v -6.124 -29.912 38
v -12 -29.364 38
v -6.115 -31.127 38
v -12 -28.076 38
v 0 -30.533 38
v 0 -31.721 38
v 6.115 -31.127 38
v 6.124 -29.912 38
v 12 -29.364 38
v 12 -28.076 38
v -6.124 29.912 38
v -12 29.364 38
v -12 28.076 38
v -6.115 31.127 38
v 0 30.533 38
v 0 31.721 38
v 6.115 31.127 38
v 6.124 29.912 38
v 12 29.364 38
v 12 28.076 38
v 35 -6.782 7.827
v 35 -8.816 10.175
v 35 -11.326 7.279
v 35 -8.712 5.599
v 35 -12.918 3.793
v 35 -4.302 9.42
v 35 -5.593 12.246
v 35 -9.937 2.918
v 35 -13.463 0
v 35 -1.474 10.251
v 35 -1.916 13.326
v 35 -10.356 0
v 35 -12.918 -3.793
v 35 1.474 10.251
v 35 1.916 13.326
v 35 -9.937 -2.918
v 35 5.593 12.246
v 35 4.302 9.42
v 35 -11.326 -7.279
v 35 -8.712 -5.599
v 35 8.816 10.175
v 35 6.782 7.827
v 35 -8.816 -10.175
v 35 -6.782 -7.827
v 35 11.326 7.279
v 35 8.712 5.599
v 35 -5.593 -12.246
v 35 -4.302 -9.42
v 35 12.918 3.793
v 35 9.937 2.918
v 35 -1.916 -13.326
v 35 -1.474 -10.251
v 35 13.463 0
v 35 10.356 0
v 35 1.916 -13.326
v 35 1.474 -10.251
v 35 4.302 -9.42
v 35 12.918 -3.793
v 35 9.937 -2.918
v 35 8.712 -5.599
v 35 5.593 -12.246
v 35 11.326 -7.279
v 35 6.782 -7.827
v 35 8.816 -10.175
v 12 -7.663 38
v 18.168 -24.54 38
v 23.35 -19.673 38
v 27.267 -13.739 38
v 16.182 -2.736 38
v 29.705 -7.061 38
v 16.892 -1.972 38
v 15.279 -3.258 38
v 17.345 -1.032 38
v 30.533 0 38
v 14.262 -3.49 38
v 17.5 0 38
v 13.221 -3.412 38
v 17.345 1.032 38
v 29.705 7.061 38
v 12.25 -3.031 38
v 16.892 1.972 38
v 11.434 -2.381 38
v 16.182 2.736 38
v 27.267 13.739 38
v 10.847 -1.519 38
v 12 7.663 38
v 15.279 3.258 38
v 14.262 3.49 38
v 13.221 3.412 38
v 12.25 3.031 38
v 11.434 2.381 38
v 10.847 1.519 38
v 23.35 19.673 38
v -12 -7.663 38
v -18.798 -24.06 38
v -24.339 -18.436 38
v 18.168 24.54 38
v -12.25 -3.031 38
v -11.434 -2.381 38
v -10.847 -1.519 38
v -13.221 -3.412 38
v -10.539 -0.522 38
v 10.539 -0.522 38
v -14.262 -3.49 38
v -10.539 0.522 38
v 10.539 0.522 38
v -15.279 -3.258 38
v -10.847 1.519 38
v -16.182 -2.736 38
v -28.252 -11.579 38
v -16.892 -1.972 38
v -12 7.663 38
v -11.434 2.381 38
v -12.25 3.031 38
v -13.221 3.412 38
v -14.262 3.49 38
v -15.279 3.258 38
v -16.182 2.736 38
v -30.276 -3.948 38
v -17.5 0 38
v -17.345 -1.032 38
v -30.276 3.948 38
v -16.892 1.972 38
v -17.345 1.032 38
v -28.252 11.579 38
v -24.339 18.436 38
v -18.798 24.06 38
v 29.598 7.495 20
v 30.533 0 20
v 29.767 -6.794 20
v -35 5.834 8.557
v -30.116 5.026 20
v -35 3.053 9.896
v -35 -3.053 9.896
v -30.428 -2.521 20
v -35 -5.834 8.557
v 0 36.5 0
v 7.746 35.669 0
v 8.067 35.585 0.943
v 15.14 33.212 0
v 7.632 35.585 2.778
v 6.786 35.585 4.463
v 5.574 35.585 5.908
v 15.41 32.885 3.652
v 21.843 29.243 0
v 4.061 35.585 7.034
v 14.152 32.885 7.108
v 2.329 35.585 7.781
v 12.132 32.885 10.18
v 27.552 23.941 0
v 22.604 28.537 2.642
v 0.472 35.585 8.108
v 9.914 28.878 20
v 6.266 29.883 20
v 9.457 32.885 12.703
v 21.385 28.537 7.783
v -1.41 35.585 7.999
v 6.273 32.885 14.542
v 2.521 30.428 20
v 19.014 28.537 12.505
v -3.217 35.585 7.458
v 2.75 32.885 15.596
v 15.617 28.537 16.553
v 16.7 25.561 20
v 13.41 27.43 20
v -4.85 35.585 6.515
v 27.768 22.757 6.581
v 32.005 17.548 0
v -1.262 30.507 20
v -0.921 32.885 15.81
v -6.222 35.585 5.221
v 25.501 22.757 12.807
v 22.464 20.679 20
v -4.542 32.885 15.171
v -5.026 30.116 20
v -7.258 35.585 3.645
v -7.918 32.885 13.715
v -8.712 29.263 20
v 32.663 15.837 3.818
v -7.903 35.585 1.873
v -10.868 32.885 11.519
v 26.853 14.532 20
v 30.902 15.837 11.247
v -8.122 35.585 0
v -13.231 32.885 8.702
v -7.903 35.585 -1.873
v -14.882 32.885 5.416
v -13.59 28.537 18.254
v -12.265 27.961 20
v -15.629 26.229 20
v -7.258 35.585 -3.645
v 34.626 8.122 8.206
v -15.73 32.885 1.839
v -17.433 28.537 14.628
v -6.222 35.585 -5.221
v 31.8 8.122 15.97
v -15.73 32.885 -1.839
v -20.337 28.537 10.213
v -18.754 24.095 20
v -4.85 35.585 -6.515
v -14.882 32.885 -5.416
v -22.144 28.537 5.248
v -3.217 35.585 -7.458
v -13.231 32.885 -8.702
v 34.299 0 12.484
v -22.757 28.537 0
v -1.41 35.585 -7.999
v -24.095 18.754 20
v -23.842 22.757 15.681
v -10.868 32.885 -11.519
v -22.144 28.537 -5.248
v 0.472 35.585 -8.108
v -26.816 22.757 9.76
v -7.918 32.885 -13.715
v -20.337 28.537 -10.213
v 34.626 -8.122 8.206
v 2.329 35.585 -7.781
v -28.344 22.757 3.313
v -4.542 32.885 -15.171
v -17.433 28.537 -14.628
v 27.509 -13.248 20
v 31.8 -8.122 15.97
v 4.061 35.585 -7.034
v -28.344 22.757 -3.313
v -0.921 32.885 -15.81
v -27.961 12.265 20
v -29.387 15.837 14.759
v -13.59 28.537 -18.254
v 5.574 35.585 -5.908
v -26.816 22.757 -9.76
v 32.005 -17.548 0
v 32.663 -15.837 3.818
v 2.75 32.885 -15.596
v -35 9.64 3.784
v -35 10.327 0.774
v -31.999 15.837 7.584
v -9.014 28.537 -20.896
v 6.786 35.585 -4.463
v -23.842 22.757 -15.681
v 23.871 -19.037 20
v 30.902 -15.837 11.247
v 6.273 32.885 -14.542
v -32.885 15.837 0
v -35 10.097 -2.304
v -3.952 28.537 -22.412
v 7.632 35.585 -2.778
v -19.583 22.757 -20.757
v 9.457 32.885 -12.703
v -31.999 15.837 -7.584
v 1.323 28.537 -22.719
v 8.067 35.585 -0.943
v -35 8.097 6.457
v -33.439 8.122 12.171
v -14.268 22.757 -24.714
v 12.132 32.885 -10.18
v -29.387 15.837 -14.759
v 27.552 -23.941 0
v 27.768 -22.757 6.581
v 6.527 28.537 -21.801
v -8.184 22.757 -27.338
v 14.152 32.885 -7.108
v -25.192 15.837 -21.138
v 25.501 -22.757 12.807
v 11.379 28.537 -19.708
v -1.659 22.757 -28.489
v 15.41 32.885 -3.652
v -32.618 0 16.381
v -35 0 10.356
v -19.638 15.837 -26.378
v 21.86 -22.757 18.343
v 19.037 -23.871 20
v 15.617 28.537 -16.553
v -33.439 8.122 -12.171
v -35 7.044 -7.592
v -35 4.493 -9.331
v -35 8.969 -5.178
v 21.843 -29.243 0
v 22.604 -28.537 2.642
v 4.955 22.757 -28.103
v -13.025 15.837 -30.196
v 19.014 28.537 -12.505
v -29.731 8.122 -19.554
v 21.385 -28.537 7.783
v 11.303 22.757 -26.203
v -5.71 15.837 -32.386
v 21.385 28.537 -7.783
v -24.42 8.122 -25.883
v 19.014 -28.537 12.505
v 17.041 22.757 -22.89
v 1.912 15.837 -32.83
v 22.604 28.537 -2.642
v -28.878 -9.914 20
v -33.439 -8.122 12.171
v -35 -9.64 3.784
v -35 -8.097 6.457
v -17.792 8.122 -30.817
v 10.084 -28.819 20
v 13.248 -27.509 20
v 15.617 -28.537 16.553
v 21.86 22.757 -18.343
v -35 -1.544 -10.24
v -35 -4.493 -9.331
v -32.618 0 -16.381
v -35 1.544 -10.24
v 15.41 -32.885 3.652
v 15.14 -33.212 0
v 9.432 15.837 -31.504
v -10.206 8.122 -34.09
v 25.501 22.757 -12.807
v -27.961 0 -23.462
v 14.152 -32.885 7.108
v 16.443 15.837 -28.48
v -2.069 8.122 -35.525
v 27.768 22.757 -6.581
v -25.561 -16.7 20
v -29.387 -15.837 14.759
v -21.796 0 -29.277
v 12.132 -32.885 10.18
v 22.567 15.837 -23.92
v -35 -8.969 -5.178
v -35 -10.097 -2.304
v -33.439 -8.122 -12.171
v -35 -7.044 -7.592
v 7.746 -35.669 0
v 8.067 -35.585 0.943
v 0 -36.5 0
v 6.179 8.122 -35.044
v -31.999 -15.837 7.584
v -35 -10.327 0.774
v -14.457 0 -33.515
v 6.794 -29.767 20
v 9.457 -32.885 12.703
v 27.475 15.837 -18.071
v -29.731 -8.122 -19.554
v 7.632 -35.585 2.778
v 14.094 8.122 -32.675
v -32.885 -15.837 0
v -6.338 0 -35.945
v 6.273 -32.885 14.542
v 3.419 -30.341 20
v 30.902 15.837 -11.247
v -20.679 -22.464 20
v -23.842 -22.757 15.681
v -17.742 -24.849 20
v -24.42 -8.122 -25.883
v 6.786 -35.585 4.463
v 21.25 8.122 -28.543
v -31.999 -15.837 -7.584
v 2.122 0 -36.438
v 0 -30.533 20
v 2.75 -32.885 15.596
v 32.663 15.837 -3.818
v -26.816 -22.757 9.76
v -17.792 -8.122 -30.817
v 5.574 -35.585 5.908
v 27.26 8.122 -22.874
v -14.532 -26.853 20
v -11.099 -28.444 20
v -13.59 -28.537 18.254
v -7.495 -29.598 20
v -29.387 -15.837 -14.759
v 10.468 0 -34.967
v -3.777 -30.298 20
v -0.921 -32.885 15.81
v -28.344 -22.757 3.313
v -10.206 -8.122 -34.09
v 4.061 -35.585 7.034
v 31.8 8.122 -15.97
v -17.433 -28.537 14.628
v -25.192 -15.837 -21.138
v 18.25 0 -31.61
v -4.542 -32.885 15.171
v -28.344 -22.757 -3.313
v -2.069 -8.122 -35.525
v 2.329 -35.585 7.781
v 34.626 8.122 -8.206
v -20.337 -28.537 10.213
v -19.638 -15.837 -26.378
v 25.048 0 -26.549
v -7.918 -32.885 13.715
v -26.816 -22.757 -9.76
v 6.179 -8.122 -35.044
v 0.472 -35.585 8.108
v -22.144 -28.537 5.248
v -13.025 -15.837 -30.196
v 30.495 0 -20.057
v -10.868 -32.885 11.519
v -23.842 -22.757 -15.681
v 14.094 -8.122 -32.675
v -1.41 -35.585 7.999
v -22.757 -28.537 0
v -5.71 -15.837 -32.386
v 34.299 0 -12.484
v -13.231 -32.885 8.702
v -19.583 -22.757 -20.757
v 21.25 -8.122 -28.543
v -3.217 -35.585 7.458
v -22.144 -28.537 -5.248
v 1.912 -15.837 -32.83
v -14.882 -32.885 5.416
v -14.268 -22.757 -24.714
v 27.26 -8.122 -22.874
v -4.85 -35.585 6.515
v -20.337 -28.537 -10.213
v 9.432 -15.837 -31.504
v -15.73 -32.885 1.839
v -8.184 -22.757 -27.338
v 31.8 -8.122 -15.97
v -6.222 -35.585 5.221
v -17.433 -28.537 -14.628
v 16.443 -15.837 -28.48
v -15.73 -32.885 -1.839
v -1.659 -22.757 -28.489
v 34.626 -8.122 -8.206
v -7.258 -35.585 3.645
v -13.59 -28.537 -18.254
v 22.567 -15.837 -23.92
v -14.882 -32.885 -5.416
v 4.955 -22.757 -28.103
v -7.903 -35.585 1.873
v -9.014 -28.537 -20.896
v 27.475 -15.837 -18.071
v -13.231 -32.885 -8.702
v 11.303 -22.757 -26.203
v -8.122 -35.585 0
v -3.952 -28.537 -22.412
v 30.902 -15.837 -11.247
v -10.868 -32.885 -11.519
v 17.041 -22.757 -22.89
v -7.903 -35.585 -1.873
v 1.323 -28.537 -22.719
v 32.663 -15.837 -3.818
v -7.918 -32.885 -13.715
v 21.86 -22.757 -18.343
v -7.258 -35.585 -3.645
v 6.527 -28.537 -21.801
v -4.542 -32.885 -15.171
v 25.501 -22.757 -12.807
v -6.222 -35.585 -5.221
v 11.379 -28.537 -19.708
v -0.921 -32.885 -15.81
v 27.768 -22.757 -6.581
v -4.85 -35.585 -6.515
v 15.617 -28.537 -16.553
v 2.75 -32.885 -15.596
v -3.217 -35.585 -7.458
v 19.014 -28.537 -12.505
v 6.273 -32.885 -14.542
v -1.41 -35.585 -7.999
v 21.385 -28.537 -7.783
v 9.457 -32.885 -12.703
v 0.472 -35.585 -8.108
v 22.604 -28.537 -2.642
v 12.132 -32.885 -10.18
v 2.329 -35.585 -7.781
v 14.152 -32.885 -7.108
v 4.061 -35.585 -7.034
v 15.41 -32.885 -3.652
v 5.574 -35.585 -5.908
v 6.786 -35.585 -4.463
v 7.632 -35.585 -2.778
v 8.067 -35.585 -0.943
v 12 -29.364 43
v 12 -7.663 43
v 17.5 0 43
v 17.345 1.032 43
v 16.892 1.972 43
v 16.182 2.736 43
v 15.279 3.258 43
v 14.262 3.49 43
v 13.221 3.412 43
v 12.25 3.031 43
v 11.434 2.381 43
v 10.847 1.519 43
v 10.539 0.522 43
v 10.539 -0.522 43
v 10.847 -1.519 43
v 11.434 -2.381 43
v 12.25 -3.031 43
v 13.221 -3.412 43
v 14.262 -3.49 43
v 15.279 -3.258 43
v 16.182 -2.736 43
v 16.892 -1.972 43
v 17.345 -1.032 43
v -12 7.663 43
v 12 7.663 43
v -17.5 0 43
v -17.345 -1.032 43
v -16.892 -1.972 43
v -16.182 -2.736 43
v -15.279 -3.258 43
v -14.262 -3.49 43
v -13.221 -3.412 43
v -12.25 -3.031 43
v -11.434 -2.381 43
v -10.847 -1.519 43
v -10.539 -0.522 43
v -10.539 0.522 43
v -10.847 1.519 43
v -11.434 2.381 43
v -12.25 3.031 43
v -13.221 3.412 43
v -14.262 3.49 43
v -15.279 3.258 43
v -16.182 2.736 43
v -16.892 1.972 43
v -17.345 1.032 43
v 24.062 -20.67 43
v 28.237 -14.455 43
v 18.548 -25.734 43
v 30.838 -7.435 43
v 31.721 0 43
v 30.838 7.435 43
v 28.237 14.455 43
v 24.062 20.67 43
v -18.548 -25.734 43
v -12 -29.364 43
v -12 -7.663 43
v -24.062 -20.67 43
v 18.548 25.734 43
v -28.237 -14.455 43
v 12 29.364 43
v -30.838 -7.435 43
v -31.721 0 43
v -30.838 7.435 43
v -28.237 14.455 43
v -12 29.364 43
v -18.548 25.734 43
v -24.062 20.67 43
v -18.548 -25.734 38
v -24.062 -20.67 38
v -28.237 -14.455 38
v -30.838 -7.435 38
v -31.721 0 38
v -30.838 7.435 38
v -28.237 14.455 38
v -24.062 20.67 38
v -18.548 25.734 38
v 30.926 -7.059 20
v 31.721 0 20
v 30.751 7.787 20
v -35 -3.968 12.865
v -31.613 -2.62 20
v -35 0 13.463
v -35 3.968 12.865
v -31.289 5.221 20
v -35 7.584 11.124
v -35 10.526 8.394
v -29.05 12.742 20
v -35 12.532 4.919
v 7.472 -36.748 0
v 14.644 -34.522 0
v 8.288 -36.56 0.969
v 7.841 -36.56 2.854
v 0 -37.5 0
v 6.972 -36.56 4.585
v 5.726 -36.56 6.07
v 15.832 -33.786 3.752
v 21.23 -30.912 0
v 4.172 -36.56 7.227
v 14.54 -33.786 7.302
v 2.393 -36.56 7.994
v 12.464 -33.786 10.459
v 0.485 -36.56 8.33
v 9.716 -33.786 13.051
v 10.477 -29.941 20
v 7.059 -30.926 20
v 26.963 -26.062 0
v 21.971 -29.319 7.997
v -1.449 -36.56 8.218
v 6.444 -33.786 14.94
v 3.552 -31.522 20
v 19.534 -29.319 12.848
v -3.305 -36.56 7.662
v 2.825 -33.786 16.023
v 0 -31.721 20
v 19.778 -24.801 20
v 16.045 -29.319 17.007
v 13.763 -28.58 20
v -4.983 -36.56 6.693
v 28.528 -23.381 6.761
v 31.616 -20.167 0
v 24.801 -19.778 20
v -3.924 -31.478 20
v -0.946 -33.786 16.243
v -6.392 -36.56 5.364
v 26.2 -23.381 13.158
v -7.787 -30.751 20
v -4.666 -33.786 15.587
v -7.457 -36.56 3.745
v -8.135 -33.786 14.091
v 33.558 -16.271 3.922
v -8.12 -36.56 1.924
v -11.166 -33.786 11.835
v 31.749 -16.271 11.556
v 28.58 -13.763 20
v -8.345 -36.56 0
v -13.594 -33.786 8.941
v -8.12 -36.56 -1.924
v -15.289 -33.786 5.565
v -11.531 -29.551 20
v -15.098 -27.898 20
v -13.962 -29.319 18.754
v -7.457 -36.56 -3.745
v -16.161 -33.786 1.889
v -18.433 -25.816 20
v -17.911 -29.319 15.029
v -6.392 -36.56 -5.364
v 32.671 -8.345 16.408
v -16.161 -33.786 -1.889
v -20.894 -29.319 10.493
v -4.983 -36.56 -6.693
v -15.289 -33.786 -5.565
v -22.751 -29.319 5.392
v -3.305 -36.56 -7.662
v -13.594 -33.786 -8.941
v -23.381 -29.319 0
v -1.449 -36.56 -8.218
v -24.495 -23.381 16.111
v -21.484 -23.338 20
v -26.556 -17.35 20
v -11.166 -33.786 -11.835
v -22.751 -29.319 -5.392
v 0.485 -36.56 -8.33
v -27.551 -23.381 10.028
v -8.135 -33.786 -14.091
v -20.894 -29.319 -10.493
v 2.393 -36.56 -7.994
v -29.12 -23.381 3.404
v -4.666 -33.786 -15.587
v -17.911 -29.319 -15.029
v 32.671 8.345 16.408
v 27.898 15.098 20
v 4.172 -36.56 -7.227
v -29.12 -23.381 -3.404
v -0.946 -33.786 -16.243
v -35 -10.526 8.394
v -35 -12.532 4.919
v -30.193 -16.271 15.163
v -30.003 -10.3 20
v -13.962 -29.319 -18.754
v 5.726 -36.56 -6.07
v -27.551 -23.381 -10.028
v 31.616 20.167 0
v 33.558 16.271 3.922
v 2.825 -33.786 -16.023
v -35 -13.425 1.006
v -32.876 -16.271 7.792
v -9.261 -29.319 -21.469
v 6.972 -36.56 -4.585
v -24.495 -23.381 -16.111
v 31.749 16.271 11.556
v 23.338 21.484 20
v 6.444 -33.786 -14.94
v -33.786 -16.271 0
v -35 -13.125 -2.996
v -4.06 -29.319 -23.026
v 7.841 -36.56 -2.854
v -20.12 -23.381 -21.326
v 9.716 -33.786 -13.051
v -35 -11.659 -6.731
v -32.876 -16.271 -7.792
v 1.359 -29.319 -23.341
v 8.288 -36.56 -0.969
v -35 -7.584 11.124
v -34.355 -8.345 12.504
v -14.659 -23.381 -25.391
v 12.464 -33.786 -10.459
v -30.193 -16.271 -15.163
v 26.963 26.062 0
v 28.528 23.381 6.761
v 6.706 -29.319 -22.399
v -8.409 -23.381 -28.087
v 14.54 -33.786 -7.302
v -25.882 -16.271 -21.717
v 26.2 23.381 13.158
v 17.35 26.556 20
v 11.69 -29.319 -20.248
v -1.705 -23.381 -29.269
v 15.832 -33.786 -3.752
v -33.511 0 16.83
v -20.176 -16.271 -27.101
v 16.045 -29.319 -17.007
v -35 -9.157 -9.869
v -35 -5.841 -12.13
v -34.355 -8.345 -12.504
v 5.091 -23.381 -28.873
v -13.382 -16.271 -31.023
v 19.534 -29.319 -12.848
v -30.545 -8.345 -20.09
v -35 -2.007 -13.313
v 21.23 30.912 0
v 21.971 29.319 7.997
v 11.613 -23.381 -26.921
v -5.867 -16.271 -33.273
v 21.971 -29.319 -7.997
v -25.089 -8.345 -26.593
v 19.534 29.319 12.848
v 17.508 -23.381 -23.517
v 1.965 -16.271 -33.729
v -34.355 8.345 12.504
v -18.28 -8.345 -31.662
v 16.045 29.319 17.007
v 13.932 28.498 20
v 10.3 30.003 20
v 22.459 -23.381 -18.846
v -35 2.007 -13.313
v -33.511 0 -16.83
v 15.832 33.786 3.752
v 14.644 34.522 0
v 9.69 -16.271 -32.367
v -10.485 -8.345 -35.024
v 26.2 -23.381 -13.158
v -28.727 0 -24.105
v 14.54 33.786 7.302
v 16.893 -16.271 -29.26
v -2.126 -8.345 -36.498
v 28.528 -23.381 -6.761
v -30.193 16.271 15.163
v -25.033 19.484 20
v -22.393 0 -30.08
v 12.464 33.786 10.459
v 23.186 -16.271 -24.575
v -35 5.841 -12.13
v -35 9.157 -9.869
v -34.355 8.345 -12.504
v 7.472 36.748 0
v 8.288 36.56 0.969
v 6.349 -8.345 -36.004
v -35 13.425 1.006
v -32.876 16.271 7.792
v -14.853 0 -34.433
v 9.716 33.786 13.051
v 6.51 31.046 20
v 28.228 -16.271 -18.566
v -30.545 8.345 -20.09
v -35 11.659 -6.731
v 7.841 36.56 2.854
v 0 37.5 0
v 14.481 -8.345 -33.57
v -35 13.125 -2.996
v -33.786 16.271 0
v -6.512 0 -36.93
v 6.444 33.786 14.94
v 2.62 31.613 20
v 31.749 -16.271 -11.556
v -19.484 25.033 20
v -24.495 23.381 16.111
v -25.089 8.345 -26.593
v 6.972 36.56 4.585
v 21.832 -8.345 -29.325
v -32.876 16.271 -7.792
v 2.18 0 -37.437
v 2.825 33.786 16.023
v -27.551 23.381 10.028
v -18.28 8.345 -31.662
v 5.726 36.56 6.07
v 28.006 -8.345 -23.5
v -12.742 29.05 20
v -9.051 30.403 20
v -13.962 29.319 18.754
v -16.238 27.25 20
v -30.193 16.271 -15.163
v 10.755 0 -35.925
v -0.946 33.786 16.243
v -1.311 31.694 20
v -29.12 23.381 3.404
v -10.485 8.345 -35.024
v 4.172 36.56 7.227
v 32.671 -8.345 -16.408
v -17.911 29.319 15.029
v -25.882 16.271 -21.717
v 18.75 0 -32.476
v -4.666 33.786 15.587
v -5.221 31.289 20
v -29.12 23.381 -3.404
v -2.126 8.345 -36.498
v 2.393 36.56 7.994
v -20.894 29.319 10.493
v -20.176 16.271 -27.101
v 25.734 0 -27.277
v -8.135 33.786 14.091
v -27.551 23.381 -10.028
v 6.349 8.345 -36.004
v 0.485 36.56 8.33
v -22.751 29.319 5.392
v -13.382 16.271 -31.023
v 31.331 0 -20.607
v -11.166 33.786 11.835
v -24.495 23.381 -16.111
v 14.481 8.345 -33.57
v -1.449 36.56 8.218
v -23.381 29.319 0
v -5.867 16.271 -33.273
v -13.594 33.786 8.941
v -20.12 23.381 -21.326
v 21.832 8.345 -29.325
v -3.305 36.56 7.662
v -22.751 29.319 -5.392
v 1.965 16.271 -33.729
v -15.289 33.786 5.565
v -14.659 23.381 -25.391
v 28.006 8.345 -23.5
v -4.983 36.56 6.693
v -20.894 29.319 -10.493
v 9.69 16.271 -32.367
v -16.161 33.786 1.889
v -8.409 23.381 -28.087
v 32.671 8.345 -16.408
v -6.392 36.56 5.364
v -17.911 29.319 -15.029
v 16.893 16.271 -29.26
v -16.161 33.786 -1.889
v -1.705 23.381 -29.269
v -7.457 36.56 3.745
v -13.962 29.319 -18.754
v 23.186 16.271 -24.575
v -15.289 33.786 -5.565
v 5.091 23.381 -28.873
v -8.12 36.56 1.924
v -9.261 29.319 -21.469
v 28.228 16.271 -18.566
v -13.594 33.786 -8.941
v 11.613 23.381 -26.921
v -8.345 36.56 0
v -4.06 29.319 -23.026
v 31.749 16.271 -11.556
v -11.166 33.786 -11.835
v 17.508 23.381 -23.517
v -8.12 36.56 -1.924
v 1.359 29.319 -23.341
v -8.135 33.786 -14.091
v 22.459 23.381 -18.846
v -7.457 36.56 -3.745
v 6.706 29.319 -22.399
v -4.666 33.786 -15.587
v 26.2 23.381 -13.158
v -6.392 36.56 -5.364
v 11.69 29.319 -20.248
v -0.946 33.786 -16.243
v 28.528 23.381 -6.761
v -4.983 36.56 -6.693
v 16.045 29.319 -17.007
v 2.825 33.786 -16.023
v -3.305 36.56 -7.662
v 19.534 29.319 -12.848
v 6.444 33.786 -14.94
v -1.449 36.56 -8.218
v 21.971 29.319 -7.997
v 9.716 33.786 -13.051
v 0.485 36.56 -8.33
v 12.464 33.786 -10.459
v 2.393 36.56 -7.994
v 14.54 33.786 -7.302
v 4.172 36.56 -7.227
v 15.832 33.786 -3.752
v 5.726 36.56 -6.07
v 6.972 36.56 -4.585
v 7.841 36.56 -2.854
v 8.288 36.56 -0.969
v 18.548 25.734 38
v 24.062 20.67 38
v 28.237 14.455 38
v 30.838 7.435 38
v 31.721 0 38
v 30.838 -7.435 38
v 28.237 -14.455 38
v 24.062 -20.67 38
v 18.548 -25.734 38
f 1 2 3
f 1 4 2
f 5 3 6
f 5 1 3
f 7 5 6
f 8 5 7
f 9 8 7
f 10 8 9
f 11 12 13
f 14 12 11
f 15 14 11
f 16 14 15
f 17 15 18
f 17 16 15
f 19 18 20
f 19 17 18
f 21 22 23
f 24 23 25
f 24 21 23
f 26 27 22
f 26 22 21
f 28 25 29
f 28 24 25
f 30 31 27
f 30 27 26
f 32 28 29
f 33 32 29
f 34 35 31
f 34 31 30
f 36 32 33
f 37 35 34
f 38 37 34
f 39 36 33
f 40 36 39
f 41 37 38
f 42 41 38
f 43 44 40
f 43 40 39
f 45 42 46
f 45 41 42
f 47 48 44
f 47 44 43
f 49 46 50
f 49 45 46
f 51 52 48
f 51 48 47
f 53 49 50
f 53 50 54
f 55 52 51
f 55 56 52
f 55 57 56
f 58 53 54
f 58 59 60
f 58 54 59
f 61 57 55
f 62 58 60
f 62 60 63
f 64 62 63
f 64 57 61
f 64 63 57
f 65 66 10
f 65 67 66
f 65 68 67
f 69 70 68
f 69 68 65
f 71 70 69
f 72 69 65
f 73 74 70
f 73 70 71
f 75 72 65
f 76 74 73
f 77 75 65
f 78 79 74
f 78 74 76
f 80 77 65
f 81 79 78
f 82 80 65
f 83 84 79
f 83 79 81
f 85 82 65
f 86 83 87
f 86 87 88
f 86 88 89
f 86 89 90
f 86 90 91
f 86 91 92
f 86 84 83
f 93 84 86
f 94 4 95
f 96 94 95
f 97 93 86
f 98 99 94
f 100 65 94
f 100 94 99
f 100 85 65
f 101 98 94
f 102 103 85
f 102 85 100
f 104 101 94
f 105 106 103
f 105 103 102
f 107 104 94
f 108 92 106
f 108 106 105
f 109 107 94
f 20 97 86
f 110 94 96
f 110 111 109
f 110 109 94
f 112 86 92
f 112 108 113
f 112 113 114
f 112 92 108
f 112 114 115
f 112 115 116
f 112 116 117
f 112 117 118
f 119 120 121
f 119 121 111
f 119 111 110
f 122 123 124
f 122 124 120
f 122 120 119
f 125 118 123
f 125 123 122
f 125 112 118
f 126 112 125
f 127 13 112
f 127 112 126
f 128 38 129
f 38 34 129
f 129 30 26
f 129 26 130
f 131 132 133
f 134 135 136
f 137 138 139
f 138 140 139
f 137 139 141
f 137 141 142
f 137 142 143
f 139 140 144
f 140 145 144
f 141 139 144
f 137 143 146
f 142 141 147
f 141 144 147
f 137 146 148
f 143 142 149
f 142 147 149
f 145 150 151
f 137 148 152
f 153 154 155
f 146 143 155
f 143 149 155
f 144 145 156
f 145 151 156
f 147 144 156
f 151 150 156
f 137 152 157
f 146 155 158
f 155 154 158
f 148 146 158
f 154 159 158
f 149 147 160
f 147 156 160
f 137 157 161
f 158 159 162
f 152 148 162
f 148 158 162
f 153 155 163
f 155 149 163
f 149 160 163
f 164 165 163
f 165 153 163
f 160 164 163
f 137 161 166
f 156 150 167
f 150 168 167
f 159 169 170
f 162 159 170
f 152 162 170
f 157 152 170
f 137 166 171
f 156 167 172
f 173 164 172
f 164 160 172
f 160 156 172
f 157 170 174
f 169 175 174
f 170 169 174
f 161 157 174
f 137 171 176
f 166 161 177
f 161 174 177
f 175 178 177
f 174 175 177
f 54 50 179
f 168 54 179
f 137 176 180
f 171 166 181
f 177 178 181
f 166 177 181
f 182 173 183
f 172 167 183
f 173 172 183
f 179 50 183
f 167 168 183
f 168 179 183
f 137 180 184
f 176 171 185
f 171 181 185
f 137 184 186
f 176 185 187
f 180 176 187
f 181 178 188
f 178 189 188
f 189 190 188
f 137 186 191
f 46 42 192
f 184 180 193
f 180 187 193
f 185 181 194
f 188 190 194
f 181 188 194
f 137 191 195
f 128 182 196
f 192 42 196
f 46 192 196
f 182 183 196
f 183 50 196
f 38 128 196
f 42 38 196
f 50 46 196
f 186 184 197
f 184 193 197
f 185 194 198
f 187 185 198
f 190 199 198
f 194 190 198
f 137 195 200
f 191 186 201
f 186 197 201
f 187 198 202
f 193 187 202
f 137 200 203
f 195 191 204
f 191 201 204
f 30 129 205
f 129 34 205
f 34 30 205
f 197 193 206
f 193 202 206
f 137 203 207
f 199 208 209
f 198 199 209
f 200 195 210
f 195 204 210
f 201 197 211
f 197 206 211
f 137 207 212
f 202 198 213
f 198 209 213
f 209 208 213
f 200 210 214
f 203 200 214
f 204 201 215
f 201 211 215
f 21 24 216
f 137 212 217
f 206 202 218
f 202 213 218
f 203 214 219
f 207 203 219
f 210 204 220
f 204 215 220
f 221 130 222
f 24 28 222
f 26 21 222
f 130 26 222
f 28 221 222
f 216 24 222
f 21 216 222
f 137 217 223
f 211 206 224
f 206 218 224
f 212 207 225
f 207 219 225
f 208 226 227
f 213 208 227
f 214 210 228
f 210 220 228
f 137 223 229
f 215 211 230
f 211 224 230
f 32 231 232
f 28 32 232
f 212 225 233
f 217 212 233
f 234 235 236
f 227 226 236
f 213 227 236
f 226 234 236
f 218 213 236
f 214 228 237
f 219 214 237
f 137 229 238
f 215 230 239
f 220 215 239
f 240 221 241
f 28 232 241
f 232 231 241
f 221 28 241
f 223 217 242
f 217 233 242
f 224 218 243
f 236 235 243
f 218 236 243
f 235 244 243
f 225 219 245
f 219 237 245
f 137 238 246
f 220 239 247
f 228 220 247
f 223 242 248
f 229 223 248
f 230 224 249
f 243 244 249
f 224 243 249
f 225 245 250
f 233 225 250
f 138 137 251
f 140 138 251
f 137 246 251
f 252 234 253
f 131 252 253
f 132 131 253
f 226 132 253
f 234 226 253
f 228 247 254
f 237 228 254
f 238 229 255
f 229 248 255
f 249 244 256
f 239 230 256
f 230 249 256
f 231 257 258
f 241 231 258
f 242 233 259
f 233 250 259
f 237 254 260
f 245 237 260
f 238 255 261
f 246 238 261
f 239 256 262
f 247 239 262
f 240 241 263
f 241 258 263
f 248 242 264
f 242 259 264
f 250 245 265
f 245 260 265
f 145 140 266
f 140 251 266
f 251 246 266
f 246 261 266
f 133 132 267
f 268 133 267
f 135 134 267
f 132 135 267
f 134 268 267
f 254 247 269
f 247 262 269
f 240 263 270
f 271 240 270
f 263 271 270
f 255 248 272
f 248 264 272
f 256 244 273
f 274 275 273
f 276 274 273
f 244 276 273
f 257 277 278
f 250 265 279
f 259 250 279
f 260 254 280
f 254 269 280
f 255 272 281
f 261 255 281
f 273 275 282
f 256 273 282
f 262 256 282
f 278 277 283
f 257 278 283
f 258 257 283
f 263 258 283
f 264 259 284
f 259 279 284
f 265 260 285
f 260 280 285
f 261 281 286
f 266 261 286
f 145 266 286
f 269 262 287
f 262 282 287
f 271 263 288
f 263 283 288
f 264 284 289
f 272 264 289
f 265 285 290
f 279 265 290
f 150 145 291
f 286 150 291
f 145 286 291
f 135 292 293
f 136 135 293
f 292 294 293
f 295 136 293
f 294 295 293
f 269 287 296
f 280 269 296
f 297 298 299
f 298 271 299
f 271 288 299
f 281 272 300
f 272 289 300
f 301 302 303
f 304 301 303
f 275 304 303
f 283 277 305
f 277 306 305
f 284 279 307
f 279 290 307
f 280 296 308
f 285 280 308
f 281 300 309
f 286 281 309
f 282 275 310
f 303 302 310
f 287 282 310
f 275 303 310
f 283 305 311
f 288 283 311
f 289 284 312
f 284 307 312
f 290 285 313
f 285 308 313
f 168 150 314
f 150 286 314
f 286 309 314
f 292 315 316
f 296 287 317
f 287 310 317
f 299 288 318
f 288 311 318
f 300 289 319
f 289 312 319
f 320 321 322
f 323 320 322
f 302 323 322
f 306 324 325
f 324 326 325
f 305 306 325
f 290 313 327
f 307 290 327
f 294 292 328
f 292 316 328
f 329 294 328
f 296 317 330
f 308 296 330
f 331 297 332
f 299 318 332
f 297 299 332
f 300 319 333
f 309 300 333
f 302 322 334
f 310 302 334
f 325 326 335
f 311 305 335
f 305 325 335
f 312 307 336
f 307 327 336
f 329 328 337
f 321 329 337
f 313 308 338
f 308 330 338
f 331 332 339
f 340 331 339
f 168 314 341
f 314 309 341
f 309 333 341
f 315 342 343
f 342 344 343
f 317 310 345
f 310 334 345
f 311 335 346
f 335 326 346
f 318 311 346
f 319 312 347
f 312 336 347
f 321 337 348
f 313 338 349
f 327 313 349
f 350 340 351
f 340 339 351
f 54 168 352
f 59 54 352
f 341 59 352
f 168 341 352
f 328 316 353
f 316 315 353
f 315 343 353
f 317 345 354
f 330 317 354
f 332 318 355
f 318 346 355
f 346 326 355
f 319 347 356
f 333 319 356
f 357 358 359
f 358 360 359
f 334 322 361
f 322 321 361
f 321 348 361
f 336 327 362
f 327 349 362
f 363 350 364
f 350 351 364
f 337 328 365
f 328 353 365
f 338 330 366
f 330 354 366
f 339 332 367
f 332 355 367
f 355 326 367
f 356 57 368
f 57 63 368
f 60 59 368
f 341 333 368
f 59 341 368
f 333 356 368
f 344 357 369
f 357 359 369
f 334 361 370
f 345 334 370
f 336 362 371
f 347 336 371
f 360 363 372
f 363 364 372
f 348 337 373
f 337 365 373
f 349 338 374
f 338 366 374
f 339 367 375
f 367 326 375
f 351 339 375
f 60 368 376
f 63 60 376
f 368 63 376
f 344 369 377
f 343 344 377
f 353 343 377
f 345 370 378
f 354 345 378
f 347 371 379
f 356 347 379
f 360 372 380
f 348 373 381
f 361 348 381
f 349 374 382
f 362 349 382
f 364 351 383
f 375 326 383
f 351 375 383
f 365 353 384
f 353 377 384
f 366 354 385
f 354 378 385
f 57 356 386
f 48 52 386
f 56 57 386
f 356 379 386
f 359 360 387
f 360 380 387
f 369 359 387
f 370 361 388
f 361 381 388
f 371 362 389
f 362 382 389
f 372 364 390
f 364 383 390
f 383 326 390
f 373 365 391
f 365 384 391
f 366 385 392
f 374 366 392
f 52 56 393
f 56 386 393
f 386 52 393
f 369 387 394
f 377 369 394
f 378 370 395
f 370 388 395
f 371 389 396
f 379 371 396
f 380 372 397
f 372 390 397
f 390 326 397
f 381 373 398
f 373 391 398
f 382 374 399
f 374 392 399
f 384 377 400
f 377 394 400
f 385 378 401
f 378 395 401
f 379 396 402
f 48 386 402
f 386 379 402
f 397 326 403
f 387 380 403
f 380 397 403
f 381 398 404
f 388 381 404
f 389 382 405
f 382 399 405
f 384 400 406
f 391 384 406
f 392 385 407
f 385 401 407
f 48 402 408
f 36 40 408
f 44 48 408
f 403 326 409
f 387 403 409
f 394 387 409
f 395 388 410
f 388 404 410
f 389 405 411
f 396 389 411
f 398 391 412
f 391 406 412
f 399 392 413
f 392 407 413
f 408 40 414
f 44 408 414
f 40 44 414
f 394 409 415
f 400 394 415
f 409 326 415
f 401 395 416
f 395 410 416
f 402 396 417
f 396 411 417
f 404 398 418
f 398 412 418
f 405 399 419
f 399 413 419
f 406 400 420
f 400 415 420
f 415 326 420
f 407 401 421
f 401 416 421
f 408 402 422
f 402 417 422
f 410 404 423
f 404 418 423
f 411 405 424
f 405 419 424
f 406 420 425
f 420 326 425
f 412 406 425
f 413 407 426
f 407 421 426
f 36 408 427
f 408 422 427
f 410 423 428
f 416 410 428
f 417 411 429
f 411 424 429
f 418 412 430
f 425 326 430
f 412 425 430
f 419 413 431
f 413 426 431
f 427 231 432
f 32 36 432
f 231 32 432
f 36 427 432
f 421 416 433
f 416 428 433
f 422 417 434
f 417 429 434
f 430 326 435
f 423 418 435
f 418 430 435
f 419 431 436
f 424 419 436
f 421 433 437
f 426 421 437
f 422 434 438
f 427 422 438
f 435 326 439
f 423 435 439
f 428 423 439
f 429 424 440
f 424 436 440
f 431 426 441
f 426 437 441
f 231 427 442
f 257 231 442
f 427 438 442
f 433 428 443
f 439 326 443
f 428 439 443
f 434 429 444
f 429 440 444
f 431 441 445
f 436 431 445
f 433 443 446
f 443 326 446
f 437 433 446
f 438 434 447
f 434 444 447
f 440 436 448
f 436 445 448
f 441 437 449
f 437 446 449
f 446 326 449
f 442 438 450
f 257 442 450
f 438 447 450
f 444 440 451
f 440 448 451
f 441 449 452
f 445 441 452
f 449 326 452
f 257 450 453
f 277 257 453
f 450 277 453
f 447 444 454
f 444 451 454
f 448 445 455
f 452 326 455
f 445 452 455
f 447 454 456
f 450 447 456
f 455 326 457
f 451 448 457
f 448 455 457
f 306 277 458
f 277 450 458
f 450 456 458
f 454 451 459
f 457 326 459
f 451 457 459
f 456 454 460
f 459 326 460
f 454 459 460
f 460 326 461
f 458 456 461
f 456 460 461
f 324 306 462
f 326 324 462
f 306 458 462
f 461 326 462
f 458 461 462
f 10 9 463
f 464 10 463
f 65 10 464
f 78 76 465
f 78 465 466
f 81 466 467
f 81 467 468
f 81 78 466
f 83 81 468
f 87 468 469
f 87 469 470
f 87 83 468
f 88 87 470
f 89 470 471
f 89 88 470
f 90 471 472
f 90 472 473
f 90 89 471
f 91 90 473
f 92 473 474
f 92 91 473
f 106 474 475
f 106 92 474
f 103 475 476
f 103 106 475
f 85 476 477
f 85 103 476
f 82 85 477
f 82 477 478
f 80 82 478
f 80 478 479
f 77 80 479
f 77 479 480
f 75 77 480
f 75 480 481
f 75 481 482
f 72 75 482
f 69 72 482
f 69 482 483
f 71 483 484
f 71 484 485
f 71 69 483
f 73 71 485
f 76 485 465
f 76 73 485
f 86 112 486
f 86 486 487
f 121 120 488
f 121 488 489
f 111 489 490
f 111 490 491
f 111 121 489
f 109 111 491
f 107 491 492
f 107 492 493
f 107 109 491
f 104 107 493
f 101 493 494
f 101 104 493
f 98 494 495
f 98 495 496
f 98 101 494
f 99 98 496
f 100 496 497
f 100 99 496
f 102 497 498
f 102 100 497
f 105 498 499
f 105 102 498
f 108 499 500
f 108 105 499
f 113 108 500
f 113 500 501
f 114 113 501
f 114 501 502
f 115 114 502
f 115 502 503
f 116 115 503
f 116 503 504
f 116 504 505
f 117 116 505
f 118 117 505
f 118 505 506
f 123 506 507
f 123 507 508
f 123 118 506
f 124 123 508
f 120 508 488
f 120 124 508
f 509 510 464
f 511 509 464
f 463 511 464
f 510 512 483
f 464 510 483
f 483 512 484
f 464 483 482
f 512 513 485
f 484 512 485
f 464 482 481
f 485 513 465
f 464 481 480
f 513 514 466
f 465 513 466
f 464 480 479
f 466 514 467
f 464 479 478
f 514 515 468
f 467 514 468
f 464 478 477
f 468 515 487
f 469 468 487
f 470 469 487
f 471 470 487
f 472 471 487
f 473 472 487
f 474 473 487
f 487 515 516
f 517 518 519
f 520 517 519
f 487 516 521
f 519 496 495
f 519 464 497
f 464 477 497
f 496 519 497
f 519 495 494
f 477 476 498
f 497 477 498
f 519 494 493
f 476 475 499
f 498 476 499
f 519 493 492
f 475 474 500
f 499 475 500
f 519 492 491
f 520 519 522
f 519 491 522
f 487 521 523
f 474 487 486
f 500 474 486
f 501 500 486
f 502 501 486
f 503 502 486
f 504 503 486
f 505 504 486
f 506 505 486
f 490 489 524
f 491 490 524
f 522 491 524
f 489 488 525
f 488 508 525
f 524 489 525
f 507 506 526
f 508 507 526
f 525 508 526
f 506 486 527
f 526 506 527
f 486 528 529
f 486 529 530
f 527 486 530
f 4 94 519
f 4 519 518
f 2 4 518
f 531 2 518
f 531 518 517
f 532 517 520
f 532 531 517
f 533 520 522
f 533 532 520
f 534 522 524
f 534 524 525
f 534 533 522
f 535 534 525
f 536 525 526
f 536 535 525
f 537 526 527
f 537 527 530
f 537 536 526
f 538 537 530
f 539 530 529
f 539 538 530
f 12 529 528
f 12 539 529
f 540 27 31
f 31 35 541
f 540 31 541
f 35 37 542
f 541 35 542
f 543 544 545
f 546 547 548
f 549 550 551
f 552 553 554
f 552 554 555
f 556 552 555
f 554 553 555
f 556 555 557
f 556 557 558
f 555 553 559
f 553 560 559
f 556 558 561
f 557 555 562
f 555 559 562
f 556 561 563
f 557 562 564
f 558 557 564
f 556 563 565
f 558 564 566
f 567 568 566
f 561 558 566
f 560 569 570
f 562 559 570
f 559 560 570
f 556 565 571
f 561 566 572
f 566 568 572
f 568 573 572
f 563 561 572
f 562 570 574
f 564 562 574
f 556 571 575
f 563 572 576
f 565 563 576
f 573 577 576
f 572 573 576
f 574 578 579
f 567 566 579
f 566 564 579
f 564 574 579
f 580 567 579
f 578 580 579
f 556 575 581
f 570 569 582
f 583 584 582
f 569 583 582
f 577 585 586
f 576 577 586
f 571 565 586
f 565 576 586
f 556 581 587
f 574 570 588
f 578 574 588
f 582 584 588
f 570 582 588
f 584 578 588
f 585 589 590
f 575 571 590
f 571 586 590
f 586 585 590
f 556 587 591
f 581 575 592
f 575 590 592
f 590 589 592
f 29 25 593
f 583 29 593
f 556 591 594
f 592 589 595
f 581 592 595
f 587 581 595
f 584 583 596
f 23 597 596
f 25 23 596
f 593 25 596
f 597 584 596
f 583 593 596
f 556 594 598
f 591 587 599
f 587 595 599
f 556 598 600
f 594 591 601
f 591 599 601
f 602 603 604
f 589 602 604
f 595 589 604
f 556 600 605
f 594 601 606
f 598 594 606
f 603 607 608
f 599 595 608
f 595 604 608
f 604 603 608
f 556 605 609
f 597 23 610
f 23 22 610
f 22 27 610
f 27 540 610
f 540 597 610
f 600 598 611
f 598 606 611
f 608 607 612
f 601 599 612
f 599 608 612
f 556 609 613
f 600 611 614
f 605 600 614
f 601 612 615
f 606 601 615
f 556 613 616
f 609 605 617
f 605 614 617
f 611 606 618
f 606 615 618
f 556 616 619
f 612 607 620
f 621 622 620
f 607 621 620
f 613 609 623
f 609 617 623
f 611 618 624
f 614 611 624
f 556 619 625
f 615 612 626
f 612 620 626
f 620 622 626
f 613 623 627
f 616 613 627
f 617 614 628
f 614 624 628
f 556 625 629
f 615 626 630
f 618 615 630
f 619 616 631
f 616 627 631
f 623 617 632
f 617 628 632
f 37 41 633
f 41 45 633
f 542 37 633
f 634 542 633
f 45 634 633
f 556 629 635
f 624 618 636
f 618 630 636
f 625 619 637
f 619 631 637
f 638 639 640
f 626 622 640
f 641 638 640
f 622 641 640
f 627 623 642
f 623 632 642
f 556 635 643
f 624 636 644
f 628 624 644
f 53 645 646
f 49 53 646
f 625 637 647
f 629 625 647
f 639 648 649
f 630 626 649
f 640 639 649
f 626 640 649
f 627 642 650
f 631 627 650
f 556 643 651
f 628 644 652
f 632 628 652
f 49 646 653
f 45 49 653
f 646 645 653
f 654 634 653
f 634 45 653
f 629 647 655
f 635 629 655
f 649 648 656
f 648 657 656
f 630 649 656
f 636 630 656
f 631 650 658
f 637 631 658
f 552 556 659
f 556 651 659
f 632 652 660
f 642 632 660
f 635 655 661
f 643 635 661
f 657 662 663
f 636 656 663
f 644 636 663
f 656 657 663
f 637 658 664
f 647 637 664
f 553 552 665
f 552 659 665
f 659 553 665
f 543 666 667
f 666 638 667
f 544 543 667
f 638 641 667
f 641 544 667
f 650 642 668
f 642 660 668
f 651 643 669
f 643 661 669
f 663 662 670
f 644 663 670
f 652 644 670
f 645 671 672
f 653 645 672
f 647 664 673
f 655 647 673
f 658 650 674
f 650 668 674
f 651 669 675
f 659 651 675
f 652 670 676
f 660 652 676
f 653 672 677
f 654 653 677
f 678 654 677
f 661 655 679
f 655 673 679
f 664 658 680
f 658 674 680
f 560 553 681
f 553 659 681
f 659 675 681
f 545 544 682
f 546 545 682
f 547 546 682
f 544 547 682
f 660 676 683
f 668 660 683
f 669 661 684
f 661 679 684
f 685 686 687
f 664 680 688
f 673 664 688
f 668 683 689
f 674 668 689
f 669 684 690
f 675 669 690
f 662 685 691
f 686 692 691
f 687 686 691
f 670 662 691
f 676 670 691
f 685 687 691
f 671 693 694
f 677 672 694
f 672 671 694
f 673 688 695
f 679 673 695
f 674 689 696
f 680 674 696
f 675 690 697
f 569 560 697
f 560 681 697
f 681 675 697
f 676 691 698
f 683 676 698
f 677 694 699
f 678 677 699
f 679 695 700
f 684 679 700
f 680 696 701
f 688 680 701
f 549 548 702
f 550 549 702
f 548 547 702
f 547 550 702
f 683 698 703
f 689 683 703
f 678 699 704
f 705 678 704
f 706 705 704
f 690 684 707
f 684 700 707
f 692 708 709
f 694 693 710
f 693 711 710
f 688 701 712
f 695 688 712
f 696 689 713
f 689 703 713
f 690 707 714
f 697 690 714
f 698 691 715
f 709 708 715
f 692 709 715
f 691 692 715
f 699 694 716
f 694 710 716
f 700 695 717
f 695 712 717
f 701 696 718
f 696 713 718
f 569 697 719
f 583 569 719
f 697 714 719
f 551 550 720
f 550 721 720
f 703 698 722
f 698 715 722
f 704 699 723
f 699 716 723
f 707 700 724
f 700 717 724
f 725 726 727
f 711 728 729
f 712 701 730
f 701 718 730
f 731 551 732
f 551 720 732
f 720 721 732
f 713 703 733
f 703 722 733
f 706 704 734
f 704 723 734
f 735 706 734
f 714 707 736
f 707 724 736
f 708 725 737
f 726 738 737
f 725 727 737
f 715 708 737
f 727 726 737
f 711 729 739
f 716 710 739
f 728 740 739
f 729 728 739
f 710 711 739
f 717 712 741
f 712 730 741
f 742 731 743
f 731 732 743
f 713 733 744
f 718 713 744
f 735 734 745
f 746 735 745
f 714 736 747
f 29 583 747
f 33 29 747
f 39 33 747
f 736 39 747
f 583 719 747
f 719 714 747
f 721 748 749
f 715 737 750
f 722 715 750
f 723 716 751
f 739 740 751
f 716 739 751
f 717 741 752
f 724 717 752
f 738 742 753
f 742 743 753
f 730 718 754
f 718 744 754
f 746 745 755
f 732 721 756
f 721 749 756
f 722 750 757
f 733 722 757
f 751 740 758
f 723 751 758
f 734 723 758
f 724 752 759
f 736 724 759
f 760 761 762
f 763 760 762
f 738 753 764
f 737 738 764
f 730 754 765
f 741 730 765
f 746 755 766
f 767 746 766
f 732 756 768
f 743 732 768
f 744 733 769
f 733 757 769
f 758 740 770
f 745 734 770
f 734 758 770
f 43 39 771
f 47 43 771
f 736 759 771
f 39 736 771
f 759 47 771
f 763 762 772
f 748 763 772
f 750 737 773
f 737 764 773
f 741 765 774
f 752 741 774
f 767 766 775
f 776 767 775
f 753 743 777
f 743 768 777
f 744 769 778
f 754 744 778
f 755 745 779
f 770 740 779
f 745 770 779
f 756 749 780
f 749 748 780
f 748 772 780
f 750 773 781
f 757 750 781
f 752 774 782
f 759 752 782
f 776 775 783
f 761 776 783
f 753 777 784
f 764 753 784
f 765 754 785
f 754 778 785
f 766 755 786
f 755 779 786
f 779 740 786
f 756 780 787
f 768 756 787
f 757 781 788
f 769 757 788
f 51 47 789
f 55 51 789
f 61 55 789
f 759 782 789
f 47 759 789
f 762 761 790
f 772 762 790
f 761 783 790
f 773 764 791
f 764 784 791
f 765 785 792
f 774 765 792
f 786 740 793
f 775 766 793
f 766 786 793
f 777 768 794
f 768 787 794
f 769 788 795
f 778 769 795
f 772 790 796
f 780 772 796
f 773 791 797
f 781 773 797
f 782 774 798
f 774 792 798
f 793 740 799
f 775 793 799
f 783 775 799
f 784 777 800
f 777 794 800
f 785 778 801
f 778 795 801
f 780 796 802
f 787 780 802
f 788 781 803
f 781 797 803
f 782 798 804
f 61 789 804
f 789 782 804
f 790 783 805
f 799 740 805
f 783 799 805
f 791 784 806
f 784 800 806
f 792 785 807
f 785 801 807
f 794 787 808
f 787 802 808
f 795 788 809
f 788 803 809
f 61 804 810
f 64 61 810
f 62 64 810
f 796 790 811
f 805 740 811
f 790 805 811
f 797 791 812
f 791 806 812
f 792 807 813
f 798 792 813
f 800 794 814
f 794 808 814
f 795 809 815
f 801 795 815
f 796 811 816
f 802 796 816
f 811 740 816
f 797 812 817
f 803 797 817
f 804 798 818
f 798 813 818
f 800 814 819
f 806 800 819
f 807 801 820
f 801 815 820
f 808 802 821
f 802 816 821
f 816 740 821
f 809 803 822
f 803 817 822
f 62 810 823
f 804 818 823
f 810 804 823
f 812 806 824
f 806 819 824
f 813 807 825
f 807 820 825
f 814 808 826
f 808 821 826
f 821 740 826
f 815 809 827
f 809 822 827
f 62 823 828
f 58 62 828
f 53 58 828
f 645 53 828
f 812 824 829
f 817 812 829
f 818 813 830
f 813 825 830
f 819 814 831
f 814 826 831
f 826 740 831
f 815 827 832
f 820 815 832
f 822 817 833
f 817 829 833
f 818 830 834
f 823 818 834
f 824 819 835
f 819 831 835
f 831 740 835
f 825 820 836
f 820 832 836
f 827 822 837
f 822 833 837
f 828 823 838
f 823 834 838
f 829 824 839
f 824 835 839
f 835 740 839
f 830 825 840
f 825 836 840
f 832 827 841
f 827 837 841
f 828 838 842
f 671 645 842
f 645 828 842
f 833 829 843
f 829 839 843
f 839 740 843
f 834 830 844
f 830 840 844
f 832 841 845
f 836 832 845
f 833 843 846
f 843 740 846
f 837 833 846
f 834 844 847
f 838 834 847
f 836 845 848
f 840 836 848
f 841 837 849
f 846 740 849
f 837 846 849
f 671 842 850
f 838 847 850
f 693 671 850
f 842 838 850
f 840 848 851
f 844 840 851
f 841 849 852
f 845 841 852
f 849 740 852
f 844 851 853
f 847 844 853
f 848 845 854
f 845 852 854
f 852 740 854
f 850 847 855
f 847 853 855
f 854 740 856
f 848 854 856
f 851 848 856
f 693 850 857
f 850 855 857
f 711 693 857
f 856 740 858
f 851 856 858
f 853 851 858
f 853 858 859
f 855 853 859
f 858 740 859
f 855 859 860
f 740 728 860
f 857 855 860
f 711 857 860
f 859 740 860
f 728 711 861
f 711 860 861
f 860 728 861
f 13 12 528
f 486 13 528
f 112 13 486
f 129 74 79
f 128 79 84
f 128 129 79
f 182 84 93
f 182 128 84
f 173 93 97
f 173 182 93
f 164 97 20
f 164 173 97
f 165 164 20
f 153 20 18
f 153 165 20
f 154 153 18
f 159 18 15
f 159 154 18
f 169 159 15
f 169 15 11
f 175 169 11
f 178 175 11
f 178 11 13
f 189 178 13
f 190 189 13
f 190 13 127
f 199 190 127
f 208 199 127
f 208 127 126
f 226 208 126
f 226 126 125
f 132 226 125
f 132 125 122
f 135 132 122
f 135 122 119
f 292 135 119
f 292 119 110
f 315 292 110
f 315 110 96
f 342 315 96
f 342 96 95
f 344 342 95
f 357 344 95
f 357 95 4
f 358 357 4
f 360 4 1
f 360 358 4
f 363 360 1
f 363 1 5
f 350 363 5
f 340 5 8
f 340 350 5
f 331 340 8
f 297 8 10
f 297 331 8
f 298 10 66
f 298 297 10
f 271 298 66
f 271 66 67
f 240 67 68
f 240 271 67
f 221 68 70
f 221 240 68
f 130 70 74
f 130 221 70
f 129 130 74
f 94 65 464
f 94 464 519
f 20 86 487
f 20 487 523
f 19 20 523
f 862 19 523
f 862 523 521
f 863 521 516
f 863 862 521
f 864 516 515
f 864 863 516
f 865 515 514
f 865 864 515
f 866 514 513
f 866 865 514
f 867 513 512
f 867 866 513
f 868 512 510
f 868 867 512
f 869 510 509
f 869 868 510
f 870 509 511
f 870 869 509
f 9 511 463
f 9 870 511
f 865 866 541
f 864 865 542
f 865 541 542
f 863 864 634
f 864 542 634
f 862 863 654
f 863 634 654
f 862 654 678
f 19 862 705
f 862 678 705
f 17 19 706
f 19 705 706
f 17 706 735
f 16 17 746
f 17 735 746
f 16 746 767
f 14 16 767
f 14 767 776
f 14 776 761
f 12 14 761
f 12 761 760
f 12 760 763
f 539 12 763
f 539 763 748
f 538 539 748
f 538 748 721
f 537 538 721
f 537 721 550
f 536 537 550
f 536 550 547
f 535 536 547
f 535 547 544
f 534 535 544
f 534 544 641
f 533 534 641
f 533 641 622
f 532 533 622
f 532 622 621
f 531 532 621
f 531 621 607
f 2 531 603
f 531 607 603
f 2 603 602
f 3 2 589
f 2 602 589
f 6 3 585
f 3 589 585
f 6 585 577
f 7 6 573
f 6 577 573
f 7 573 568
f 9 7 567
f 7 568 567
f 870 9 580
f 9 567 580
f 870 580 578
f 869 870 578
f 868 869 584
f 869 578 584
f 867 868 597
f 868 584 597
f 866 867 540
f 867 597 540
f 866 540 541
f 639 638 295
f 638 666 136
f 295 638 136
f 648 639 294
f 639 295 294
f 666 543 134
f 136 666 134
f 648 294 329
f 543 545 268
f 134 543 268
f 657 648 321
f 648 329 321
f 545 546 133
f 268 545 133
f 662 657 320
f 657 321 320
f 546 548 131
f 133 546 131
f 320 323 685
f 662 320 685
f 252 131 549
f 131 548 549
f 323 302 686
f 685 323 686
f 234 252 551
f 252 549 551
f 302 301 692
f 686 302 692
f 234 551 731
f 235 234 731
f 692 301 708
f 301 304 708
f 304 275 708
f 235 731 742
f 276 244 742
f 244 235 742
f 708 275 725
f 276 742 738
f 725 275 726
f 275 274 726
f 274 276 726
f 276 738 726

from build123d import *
from build123d.topology import SkipClean

# Parameters (mm, degrees)
CUT_EXTRUDE1_REACH  = 80.222
SKETCH2_R           = 37.5
CUT_EXTRUDE2_REACH  = 91.826
SKETCH4_R           = 37.5
SKETCH5_R           = 31.721443851
SKETCH5_R_2         = 30.532769282
BOSS_EXTRUDE1_DEPTH = 18
SKETCH6_R           = 3.5
BOSS_EXTRUDE2_DEPTH = 5


with BuildPart() as part:
    # Sketch1 → Revolve-Thin4 (revolve)
    with BuildSketch(Plane.XY):
        with BuildLine():
            ThreePointArc((0, -37.5), (37.5, 0), (0, 37.5))
            Line((0, 37.5), (0, 36.5))
            ThreePointArc((0, 36.5), (36.5, 0), (0, -36.5))
            Line((0, -36.5), (0, -37.5))
        make_face()
    revolve(axis=Axis((0, 37.5, 0), (0, -1, 0)))

    # Sketch2 → Cut-Extrude1 (cut, up to next)
    with BuildSketch(Plane.XY.offset(20), mode=Mode.PRIVATE) as cut_extrude1_sk1:
        Circle(SKETCH2_R)
    cut_extrude1_tool1 = extrude(cut_extrude1_sk1.sketch, amount=CUT_EXTRUDE1_REACH, mode=Mode.PRIVATE) & part.part
    add(cut_extrude1_tool1.solids().sort_by_distance((0, 0, 20))[0], mode=Mode.SUBTRACT)

    # Sketch4 → Cut-Extrude2 (cut, up to next)
    with BuildSketch(Plane(origin=(-35, 0, 0), x_dir=(0, 0, -1), z_dir=(1, 0, 0)), mode=Mode.PRIVATE) as cut_extrude2_sk1:
        Circle(SKETCH4_R)
    cut_extrude2_tool1 = extrude(cut_extrude2_sk1.sketch, amount=-CUT_EXTRUDE2_REACH, mode=Mode.PRIVATE) & part.part
    cut_extrude2 = cut_extrude2_tool1.solids().sort_by_distance((-35, 0, 0))[0]
    add(cut_extrude2, mode=Mode.SUBTRACT)

    # Mirror1: Cut-Extrude2 across plane
    add(cut_extrude2.mirror(Plane(origin=(0, 0, 0), x_dir=(0, 0, 1), z_dir=(1, 0, 0))), mode=Mode.SUBTRACT)

    # Sketch5 → Boss-Extrude1 (add)
    with SkipClean():  # the faces are left unmerged after this step: merging them gives an invalid solid
        with BuildSketch(Plane.XY.offset(20)):
            Circle(SKETCH5_R)
            Circle(SKETCH5_R_2, mode=Mode.SUBTRACT)
        extrude(amount=BOSS_EXTRUDE1_DEPTH)

    # Sketch6 → Boss-Extrude2 (add)
    with SkipClean():  # the faces are left unmerged after this step: merging them gives an invalid solid
        with BuildSketch(Plane.XY.offset(38)):
            with BuildLine():
                Line((-12, 29.36409372), (-12, 7.663369949))
                Line((-12, 7.663369949), (12, 7.663369949))
                Line((12, 7.663369949), (12, 29.36409372))
                ThreePointArc((12, 29.36409372), (31.721443851, 0), (12, -29.36409372))
                Line((12, -29.36409372), (12, -7.663369949))
                Line((12, -7.663369949), (-12, -7.663369949))
                Line((-12, -7.663369949), (-12, -29.36409372))
                ThreePointArc((-12, -29.36409372), (-31.721443851, 0), (-12, 29.36409372))
            make_face()
            with Locations((14, 0)):
                Circle(SKETCH6_R, mode=Mode.SUBTRACT)
            with Locations(Location((-14, 0, 0), (0, 0, 180))):
                Circle(SKETCH6_R, mode=Mode.SUBTRACT)
        extrude(amount=BOSS_EXTRUDE2_DEPTH)


solid = part.part
